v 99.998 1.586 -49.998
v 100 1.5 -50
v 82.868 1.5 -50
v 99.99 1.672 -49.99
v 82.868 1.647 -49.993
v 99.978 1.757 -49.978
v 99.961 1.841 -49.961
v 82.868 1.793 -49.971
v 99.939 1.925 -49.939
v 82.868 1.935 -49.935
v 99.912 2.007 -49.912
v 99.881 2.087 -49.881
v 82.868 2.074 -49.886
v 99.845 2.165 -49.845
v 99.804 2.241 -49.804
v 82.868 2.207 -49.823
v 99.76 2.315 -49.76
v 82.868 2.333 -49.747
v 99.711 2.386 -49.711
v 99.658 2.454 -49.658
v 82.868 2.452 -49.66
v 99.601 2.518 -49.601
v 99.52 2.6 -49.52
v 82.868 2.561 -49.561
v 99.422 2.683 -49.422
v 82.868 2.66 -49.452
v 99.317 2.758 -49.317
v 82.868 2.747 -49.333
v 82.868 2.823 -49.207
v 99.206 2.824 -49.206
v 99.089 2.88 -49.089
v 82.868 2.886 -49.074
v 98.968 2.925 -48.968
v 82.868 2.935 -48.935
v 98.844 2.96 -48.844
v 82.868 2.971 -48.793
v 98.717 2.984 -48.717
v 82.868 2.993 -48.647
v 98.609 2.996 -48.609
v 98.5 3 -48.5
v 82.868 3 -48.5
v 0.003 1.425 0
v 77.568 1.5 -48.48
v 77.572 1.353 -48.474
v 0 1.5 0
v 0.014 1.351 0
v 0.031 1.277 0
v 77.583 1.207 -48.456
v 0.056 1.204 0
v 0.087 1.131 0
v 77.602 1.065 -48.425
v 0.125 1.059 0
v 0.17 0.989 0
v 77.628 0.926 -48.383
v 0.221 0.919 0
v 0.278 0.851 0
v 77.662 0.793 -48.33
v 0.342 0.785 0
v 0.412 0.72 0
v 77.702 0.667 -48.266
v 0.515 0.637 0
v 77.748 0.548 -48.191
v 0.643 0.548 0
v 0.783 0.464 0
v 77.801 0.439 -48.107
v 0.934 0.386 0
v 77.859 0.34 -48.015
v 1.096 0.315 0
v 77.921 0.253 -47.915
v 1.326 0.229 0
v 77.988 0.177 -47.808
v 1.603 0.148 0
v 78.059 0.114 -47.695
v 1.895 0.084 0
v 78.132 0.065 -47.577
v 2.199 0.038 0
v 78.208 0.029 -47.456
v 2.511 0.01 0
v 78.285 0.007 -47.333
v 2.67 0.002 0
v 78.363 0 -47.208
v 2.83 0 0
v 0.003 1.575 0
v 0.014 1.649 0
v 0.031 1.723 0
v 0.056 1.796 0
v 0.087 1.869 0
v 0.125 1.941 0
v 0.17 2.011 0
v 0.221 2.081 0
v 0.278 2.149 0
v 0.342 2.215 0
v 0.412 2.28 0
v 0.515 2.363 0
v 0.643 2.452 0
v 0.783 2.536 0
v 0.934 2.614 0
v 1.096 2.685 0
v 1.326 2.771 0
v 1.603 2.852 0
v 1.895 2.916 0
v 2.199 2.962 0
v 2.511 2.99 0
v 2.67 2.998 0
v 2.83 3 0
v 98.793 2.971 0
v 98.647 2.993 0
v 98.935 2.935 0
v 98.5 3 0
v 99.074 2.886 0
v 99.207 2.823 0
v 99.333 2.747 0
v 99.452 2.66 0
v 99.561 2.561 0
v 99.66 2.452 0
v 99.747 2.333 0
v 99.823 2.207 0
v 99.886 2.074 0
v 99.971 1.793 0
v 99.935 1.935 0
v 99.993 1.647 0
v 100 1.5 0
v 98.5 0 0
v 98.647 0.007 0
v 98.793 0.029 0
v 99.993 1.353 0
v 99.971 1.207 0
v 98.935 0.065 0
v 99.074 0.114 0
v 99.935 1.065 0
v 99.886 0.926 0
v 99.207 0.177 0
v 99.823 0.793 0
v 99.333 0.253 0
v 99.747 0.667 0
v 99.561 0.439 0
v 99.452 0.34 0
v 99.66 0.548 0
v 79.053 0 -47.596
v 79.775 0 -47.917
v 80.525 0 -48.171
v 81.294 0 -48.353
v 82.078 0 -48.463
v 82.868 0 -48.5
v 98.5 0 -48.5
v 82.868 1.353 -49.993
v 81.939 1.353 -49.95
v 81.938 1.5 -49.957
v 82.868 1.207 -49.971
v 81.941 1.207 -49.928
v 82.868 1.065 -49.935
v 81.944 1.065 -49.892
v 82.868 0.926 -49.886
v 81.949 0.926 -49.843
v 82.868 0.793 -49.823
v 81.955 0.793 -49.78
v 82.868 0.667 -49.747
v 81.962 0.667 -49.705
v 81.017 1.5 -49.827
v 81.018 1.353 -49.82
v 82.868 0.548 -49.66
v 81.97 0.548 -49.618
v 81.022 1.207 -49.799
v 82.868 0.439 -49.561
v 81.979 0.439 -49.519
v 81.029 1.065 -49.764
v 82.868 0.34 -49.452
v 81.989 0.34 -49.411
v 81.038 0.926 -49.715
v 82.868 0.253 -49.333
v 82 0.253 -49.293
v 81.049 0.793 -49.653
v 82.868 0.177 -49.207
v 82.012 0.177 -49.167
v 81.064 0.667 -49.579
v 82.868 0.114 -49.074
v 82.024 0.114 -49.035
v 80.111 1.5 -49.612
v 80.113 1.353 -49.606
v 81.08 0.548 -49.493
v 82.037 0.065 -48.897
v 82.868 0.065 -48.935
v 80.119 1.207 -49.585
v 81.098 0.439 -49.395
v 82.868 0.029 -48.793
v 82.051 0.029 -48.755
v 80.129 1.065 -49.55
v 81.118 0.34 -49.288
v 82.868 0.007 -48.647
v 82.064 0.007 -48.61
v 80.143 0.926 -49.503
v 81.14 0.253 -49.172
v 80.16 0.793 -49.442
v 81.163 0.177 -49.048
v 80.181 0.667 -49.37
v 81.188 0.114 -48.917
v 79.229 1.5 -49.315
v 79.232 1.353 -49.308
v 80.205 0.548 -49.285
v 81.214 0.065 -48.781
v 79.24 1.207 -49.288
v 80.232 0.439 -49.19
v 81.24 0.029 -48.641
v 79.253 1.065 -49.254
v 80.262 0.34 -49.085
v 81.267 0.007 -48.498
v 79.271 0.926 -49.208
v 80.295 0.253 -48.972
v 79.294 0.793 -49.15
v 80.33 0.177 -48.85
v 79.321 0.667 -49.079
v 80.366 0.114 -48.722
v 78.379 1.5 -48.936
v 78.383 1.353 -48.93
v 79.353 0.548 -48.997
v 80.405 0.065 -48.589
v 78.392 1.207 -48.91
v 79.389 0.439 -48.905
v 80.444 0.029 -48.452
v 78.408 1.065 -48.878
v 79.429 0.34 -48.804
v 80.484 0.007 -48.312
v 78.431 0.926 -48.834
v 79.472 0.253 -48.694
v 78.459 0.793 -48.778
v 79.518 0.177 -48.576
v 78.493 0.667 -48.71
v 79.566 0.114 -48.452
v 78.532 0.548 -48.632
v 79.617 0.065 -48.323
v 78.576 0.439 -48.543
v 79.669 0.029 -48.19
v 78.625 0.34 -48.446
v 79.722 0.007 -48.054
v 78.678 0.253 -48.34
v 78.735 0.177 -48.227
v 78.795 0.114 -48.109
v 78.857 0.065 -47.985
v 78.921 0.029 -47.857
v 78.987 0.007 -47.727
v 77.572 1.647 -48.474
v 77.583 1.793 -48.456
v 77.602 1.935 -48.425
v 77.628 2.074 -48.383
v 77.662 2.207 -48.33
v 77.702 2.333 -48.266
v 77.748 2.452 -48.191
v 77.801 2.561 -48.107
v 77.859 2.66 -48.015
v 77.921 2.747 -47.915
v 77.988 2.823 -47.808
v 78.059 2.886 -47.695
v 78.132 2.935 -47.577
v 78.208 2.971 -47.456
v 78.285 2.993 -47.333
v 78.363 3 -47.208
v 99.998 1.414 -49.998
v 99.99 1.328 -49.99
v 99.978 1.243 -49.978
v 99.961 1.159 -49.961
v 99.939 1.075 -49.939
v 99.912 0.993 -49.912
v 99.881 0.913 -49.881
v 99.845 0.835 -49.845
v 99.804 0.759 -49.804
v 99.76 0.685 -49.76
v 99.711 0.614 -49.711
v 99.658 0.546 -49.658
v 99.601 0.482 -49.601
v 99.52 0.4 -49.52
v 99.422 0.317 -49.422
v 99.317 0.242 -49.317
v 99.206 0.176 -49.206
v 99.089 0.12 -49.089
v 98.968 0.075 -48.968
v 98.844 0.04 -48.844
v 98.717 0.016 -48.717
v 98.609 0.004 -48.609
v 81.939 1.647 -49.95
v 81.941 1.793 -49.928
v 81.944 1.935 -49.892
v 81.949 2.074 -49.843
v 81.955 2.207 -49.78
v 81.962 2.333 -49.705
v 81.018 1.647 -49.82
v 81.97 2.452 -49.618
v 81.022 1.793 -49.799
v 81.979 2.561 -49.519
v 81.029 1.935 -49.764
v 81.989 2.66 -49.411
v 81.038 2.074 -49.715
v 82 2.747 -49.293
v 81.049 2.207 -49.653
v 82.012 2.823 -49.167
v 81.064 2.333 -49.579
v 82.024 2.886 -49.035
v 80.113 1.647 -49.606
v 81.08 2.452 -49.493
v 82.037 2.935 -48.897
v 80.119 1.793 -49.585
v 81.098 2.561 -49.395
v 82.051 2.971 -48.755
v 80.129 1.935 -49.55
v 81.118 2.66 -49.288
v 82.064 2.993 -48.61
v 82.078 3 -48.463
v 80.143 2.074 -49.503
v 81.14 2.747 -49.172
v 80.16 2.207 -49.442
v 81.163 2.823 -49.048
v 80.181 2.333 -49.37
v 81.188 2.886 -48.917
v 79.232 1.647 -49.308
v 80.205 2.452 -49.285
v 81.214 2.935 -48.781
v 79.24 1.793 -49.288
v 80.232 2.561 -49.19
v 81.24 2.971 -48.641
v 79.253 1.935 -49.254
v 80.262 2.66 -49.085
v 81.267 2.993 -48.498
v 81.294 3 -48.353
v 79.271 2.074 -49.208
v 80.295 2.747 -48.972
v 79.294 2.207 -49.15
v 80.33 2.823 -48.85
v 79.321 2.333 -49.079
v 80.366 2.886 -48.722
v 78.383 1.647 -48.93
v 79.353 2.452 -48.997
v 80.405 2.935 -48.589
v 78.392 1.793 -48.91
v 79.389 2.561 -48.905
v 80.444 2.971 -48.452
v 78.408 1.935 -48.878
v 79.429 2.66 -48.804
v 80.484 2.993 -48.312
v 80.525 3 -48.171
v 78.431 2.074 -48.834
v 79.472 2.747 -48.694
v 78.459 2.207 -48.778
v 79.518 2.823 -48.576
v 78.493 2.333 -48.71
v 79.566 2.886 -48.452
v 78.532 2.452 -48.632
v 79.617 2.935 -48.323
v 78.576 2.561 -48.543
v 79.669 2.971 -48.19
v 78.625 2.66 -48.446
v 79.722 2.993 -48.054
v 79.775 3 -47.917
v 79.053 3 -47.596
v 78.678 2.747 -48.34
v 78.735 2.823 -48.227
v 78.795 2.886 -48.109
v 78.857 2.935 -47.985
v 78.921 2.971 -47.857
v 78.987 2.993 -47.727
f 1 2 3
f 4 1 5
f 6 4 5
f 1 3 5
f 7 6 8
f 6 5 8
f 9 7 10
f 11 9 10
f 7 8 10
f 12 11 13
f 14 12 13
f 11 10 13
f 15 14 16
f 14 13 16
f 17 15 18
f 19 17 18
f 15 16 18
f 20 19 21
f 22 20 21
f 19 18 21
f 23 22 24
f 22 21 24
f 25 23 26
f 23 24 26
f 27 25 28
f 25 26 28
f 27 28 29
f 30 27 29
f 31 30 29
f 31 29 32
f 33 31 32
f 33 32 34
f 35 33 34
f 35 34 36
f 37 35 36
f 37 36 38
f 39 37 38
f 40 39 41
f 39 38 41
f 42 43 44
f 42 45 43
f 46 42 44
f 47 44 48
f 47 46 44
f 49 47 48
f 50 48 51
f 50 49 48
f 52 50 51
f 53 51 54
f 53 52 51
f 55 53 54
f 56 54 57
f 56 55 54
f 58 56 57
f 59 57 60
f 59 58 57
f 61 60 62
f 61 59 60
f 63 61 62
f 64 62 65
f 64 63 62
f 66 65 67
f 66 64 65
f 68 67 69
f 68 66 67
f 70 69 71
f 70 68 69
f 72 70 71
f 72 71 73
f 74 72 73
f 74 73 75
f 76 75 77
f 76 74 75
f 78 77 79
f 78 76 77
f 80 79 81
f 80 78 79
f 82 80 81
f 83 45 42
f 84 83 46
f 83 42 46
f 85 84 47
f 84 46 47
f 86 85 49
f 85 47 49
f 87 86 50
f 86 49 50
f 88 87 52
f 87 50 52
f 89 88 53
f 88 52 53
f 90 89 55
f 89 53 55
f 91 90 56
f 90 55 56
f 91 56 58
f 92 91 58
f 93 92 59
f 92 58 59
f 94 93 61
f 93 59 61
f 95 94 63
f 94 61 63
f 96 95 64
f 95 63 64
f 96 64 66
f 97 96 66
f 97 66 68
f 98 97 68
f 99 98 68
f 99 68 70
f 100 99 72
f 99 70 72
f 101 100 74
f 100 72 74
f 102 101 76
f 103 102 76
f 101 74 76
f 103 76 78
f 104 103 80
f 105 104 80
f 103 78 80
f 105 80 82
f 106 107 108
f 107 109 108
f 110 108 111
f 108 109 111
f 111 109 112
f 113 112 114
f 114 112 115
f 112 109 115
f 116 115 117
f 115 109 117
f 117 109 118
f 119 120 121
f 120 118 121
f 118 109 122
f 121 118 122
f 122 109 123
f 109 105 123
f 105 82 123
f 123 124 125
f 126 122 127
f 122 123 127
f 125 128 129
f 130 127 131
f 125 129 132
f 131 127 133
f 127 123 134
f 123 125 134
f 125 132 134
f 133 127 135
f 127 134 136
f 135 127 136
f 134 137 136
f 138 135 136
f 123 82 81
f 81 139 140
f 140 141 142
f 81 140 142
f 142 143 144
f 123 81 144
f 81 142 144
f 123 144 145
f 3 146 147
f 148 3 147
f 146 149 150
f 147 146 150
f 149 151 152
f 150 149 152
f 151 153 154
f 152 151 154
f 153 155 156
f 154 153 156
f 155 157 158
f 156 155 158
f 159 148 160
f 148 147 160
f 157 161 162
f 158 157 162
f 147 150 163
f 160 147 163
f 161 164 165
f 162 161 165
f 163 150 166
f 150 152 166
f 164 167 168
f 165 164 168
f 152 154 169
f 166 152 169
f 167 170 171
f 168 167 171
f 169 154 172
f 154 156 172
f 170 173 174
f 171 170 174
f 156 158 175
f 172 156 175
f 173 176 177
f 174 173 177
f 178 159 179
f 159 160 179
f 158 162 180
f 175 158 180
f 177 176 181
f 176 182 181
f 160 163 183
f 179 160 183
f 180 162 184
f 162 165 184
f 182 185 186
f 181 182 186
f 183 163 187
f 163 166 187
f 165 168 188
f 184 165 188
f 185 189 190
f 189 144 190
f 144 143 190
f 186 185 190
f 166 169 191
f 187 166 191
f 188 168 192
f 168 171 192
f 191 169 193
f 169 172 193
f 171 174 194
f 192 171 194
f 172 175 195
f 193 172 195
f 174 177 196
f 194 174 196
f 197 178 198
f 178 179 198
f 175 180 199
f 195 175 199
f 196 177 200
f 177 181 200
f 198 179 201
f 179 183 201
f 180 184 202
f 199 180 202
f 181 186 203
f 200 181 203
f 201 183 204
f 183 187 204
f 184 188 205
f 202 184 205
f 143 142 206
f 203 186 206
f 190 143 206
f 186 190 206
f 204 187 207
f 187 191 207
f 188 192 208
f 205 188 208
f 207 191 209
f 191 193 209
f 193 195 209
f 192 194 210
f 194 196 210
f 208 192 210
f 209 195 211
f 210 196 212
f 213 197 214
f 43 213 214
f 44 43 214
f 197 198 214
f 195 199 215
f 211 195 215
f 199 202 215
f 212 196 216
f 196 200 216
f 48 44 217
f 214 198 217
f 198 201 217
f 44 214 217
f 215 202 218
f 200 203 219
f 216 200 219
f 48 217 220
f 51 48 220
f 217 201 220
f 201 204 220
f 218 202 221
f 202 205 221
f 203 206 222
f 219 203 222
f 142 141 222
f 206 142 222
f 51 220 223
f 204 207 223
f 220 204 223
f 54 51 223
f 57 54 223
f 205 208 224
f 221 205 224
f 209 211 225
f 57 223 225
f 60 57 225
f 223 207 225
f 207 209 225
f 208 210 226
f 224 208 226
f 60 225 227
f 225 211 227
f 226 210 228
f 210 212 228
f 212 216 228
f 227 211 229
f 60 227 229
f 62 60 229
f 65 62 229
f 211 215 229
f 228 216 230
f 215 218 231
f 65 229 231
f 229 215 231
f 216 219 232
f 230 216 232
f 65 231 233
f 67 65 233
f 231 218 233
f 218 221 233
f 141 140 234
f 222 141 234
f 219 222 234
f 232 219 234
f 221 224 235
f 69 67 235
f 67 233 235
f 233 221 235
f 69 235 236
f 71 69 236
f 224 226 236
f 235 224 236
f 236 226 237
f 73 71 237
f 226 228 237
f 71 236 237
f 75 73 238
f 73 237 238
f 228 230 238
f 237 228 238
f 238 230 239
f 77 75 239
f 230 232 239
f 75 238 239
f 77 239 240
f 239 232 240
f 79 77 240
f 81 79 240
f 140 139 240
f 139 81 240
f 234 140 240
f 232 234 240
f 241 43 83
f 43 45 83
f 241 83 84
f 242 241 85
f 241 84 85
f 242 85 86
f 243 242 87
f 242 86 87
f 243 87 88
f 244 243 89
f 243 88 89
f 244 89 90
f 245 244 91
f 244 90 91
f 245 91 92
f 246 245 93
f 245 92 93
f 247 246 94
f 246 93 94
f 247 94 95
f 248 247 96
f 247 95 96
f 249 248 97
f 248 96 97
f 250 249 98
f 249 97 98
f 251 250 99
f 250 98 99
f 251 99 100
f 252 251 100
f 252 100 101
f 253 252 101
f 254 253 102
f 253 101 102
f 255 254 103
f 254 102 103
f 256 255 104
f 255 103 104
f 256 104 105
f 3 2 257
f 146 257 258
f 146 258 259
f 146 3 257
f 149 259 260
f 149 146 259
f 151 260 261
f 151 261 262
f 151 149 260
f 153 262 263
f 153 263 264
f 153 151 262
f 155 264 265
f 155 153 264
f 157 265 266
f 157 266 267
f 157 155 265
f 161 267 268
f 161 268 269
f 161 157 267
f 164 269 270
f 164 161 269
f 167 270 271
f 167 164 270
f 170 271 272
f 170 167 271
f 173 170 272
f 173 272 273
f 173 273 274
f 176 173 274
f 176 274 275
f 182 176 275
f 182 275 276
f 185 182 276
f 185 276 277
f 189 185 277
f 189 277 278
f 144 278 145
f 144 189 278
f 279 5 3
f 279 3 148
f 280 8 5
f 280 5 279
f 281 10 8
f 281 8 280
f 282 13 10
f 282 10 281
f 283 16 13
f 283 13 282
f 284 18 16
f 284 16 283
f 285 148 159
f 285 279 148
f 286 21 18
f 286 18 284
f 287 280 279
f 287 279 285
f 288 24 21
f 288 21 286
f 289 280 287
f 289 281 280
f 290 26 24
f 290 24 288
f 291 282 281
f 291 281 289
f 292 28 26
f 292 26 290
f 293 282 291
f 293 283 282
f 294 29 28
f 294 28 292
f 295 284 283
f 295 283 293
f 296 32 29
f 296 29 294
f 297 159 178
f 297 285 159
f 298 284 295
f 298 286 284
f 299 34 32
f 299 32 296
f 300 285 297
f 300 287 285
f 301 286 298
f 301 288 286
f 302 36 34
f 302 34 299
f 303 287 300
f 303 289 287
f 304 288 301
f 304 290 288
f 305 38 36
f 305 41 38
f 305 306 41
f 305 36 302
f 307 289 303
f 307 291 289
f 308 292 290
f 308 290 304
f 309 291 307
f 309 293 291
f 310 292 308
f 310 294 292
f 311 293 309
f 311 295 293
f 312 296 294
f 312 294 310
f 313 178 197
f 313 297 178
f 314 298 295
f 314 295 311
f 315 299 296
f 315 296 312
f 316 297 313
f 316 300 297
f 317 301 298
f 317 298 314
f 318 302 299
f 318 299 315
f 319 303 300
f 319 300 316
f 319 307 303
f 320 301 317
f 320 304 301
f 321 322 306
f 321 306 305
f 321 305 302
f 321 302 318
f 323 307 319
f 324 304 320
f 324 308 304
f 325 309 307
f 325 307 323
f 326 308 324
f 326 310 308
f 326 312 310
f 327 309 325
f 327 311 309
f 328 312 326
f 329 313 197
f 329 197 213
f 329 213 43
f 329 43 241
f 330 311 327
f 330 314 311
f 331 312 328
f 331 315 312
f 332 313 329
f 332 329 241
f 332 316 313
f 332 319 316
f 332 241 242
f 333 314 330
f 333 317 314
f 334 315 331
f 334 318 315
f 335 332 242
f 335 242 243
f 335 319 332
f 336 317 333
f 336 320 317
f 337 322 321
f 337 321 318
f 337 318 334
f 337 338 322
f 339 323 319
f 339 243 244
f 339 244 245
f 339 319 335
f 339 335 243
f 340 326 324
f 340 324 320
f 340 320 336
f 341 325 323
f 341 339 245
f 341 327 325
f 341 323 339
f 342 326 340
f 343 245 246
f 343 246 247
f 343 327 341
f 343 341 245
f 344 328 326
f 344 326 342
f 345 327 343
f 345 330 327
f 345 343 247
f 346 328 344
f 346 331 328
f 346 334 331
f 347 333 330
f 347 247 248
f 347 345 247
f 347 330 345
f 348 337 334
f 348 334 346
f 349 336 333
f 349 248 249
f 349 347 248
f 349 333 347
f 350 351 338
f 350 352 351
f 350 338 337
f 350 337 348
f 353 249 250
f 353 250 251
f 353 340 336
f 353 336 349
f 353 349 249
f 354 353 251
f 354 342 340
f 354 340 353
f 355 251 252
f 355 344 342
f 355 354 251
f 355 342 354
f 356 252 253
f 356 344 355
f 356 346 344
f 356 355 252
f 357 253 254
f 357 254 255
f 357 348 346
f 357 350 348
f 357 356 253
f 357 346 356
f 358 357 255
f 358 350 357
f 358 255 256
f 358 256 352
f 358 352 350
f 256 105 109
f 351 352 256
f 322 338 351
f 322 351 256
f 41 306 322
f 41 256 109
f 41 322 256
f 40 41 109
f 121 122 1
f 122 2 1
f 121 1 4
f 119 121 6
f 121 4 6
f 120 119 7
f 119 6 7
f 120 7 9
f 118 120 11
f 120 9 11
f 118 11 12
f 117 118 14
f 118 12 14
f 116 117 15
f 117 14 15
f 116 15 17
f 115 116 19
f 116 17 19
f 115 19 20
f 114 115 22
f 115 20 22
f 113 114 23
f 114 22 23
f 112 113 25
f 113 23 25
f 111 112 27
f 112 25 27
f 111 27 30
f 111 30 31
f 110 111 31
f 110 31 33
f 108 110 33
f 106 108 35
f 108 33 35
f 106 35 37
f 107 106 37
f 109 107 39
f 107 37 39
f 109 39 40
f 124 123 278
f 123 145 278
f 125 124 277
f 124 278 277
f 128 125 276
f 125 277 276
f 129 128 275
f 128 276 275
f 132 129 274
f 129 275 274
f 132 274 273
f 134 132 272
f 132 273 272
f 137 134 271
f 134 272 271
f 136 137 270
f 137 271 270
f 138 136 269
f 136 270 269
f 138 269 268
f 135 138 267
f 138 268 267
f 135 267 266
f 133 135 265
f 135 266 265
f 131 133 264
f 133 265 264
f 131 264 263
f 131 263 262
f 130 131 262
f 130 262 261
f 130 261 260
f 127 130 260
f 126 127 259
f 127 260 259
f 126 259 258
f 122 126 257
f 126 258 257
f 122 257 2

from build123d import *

# Parameters (mm, degrees)
BOSS_EXTRUDE1_DEPTH = 3
FILLET1_R           = 10
FILLET2_R           = 1.5


with BuildPart() as part:
    # Sketch1 → Boss-Extrude1 (new body)
    with BuildSketch(Plane(origin=(0, 0, 0), x_dir=(1, 0, 0), z_dir=(0, 1, 0))):
        Polygon((0, 0), (100, 0), (100, 50), (80, 50), align=None)
    extrude(amount=BOSS_EXTRUDE1_DEPTH)

    # Fillet1
    fillet1_edges = [part.edges().sort_by_distance(p)[0] for p in [
        (80, 1.5, -50),
    ]]
    fillet(fillet1_edges, radius=FILLET1_R)

    # Fillet2
    fillet2_edges = [part.edges().sort_by_distance(p)[0] for p in [
        (91.433981132, 0, -50),
        (80.111137134, 0, -49.612487462),
        (91.433981132, 3, -50),
        (80.111137134, 3, -49.612487462),
        (100, 3, -25),
        (100, 0, -25),
        (38.783986432, 0, -24.23999152),
        (38.783986432, 3, -24.23999152),
    ]]
    fillet(fillet2_edges, radius=FILLET2_R - 0.0001)  # a hair under: the kernel refuses the full size


solid = part.part
